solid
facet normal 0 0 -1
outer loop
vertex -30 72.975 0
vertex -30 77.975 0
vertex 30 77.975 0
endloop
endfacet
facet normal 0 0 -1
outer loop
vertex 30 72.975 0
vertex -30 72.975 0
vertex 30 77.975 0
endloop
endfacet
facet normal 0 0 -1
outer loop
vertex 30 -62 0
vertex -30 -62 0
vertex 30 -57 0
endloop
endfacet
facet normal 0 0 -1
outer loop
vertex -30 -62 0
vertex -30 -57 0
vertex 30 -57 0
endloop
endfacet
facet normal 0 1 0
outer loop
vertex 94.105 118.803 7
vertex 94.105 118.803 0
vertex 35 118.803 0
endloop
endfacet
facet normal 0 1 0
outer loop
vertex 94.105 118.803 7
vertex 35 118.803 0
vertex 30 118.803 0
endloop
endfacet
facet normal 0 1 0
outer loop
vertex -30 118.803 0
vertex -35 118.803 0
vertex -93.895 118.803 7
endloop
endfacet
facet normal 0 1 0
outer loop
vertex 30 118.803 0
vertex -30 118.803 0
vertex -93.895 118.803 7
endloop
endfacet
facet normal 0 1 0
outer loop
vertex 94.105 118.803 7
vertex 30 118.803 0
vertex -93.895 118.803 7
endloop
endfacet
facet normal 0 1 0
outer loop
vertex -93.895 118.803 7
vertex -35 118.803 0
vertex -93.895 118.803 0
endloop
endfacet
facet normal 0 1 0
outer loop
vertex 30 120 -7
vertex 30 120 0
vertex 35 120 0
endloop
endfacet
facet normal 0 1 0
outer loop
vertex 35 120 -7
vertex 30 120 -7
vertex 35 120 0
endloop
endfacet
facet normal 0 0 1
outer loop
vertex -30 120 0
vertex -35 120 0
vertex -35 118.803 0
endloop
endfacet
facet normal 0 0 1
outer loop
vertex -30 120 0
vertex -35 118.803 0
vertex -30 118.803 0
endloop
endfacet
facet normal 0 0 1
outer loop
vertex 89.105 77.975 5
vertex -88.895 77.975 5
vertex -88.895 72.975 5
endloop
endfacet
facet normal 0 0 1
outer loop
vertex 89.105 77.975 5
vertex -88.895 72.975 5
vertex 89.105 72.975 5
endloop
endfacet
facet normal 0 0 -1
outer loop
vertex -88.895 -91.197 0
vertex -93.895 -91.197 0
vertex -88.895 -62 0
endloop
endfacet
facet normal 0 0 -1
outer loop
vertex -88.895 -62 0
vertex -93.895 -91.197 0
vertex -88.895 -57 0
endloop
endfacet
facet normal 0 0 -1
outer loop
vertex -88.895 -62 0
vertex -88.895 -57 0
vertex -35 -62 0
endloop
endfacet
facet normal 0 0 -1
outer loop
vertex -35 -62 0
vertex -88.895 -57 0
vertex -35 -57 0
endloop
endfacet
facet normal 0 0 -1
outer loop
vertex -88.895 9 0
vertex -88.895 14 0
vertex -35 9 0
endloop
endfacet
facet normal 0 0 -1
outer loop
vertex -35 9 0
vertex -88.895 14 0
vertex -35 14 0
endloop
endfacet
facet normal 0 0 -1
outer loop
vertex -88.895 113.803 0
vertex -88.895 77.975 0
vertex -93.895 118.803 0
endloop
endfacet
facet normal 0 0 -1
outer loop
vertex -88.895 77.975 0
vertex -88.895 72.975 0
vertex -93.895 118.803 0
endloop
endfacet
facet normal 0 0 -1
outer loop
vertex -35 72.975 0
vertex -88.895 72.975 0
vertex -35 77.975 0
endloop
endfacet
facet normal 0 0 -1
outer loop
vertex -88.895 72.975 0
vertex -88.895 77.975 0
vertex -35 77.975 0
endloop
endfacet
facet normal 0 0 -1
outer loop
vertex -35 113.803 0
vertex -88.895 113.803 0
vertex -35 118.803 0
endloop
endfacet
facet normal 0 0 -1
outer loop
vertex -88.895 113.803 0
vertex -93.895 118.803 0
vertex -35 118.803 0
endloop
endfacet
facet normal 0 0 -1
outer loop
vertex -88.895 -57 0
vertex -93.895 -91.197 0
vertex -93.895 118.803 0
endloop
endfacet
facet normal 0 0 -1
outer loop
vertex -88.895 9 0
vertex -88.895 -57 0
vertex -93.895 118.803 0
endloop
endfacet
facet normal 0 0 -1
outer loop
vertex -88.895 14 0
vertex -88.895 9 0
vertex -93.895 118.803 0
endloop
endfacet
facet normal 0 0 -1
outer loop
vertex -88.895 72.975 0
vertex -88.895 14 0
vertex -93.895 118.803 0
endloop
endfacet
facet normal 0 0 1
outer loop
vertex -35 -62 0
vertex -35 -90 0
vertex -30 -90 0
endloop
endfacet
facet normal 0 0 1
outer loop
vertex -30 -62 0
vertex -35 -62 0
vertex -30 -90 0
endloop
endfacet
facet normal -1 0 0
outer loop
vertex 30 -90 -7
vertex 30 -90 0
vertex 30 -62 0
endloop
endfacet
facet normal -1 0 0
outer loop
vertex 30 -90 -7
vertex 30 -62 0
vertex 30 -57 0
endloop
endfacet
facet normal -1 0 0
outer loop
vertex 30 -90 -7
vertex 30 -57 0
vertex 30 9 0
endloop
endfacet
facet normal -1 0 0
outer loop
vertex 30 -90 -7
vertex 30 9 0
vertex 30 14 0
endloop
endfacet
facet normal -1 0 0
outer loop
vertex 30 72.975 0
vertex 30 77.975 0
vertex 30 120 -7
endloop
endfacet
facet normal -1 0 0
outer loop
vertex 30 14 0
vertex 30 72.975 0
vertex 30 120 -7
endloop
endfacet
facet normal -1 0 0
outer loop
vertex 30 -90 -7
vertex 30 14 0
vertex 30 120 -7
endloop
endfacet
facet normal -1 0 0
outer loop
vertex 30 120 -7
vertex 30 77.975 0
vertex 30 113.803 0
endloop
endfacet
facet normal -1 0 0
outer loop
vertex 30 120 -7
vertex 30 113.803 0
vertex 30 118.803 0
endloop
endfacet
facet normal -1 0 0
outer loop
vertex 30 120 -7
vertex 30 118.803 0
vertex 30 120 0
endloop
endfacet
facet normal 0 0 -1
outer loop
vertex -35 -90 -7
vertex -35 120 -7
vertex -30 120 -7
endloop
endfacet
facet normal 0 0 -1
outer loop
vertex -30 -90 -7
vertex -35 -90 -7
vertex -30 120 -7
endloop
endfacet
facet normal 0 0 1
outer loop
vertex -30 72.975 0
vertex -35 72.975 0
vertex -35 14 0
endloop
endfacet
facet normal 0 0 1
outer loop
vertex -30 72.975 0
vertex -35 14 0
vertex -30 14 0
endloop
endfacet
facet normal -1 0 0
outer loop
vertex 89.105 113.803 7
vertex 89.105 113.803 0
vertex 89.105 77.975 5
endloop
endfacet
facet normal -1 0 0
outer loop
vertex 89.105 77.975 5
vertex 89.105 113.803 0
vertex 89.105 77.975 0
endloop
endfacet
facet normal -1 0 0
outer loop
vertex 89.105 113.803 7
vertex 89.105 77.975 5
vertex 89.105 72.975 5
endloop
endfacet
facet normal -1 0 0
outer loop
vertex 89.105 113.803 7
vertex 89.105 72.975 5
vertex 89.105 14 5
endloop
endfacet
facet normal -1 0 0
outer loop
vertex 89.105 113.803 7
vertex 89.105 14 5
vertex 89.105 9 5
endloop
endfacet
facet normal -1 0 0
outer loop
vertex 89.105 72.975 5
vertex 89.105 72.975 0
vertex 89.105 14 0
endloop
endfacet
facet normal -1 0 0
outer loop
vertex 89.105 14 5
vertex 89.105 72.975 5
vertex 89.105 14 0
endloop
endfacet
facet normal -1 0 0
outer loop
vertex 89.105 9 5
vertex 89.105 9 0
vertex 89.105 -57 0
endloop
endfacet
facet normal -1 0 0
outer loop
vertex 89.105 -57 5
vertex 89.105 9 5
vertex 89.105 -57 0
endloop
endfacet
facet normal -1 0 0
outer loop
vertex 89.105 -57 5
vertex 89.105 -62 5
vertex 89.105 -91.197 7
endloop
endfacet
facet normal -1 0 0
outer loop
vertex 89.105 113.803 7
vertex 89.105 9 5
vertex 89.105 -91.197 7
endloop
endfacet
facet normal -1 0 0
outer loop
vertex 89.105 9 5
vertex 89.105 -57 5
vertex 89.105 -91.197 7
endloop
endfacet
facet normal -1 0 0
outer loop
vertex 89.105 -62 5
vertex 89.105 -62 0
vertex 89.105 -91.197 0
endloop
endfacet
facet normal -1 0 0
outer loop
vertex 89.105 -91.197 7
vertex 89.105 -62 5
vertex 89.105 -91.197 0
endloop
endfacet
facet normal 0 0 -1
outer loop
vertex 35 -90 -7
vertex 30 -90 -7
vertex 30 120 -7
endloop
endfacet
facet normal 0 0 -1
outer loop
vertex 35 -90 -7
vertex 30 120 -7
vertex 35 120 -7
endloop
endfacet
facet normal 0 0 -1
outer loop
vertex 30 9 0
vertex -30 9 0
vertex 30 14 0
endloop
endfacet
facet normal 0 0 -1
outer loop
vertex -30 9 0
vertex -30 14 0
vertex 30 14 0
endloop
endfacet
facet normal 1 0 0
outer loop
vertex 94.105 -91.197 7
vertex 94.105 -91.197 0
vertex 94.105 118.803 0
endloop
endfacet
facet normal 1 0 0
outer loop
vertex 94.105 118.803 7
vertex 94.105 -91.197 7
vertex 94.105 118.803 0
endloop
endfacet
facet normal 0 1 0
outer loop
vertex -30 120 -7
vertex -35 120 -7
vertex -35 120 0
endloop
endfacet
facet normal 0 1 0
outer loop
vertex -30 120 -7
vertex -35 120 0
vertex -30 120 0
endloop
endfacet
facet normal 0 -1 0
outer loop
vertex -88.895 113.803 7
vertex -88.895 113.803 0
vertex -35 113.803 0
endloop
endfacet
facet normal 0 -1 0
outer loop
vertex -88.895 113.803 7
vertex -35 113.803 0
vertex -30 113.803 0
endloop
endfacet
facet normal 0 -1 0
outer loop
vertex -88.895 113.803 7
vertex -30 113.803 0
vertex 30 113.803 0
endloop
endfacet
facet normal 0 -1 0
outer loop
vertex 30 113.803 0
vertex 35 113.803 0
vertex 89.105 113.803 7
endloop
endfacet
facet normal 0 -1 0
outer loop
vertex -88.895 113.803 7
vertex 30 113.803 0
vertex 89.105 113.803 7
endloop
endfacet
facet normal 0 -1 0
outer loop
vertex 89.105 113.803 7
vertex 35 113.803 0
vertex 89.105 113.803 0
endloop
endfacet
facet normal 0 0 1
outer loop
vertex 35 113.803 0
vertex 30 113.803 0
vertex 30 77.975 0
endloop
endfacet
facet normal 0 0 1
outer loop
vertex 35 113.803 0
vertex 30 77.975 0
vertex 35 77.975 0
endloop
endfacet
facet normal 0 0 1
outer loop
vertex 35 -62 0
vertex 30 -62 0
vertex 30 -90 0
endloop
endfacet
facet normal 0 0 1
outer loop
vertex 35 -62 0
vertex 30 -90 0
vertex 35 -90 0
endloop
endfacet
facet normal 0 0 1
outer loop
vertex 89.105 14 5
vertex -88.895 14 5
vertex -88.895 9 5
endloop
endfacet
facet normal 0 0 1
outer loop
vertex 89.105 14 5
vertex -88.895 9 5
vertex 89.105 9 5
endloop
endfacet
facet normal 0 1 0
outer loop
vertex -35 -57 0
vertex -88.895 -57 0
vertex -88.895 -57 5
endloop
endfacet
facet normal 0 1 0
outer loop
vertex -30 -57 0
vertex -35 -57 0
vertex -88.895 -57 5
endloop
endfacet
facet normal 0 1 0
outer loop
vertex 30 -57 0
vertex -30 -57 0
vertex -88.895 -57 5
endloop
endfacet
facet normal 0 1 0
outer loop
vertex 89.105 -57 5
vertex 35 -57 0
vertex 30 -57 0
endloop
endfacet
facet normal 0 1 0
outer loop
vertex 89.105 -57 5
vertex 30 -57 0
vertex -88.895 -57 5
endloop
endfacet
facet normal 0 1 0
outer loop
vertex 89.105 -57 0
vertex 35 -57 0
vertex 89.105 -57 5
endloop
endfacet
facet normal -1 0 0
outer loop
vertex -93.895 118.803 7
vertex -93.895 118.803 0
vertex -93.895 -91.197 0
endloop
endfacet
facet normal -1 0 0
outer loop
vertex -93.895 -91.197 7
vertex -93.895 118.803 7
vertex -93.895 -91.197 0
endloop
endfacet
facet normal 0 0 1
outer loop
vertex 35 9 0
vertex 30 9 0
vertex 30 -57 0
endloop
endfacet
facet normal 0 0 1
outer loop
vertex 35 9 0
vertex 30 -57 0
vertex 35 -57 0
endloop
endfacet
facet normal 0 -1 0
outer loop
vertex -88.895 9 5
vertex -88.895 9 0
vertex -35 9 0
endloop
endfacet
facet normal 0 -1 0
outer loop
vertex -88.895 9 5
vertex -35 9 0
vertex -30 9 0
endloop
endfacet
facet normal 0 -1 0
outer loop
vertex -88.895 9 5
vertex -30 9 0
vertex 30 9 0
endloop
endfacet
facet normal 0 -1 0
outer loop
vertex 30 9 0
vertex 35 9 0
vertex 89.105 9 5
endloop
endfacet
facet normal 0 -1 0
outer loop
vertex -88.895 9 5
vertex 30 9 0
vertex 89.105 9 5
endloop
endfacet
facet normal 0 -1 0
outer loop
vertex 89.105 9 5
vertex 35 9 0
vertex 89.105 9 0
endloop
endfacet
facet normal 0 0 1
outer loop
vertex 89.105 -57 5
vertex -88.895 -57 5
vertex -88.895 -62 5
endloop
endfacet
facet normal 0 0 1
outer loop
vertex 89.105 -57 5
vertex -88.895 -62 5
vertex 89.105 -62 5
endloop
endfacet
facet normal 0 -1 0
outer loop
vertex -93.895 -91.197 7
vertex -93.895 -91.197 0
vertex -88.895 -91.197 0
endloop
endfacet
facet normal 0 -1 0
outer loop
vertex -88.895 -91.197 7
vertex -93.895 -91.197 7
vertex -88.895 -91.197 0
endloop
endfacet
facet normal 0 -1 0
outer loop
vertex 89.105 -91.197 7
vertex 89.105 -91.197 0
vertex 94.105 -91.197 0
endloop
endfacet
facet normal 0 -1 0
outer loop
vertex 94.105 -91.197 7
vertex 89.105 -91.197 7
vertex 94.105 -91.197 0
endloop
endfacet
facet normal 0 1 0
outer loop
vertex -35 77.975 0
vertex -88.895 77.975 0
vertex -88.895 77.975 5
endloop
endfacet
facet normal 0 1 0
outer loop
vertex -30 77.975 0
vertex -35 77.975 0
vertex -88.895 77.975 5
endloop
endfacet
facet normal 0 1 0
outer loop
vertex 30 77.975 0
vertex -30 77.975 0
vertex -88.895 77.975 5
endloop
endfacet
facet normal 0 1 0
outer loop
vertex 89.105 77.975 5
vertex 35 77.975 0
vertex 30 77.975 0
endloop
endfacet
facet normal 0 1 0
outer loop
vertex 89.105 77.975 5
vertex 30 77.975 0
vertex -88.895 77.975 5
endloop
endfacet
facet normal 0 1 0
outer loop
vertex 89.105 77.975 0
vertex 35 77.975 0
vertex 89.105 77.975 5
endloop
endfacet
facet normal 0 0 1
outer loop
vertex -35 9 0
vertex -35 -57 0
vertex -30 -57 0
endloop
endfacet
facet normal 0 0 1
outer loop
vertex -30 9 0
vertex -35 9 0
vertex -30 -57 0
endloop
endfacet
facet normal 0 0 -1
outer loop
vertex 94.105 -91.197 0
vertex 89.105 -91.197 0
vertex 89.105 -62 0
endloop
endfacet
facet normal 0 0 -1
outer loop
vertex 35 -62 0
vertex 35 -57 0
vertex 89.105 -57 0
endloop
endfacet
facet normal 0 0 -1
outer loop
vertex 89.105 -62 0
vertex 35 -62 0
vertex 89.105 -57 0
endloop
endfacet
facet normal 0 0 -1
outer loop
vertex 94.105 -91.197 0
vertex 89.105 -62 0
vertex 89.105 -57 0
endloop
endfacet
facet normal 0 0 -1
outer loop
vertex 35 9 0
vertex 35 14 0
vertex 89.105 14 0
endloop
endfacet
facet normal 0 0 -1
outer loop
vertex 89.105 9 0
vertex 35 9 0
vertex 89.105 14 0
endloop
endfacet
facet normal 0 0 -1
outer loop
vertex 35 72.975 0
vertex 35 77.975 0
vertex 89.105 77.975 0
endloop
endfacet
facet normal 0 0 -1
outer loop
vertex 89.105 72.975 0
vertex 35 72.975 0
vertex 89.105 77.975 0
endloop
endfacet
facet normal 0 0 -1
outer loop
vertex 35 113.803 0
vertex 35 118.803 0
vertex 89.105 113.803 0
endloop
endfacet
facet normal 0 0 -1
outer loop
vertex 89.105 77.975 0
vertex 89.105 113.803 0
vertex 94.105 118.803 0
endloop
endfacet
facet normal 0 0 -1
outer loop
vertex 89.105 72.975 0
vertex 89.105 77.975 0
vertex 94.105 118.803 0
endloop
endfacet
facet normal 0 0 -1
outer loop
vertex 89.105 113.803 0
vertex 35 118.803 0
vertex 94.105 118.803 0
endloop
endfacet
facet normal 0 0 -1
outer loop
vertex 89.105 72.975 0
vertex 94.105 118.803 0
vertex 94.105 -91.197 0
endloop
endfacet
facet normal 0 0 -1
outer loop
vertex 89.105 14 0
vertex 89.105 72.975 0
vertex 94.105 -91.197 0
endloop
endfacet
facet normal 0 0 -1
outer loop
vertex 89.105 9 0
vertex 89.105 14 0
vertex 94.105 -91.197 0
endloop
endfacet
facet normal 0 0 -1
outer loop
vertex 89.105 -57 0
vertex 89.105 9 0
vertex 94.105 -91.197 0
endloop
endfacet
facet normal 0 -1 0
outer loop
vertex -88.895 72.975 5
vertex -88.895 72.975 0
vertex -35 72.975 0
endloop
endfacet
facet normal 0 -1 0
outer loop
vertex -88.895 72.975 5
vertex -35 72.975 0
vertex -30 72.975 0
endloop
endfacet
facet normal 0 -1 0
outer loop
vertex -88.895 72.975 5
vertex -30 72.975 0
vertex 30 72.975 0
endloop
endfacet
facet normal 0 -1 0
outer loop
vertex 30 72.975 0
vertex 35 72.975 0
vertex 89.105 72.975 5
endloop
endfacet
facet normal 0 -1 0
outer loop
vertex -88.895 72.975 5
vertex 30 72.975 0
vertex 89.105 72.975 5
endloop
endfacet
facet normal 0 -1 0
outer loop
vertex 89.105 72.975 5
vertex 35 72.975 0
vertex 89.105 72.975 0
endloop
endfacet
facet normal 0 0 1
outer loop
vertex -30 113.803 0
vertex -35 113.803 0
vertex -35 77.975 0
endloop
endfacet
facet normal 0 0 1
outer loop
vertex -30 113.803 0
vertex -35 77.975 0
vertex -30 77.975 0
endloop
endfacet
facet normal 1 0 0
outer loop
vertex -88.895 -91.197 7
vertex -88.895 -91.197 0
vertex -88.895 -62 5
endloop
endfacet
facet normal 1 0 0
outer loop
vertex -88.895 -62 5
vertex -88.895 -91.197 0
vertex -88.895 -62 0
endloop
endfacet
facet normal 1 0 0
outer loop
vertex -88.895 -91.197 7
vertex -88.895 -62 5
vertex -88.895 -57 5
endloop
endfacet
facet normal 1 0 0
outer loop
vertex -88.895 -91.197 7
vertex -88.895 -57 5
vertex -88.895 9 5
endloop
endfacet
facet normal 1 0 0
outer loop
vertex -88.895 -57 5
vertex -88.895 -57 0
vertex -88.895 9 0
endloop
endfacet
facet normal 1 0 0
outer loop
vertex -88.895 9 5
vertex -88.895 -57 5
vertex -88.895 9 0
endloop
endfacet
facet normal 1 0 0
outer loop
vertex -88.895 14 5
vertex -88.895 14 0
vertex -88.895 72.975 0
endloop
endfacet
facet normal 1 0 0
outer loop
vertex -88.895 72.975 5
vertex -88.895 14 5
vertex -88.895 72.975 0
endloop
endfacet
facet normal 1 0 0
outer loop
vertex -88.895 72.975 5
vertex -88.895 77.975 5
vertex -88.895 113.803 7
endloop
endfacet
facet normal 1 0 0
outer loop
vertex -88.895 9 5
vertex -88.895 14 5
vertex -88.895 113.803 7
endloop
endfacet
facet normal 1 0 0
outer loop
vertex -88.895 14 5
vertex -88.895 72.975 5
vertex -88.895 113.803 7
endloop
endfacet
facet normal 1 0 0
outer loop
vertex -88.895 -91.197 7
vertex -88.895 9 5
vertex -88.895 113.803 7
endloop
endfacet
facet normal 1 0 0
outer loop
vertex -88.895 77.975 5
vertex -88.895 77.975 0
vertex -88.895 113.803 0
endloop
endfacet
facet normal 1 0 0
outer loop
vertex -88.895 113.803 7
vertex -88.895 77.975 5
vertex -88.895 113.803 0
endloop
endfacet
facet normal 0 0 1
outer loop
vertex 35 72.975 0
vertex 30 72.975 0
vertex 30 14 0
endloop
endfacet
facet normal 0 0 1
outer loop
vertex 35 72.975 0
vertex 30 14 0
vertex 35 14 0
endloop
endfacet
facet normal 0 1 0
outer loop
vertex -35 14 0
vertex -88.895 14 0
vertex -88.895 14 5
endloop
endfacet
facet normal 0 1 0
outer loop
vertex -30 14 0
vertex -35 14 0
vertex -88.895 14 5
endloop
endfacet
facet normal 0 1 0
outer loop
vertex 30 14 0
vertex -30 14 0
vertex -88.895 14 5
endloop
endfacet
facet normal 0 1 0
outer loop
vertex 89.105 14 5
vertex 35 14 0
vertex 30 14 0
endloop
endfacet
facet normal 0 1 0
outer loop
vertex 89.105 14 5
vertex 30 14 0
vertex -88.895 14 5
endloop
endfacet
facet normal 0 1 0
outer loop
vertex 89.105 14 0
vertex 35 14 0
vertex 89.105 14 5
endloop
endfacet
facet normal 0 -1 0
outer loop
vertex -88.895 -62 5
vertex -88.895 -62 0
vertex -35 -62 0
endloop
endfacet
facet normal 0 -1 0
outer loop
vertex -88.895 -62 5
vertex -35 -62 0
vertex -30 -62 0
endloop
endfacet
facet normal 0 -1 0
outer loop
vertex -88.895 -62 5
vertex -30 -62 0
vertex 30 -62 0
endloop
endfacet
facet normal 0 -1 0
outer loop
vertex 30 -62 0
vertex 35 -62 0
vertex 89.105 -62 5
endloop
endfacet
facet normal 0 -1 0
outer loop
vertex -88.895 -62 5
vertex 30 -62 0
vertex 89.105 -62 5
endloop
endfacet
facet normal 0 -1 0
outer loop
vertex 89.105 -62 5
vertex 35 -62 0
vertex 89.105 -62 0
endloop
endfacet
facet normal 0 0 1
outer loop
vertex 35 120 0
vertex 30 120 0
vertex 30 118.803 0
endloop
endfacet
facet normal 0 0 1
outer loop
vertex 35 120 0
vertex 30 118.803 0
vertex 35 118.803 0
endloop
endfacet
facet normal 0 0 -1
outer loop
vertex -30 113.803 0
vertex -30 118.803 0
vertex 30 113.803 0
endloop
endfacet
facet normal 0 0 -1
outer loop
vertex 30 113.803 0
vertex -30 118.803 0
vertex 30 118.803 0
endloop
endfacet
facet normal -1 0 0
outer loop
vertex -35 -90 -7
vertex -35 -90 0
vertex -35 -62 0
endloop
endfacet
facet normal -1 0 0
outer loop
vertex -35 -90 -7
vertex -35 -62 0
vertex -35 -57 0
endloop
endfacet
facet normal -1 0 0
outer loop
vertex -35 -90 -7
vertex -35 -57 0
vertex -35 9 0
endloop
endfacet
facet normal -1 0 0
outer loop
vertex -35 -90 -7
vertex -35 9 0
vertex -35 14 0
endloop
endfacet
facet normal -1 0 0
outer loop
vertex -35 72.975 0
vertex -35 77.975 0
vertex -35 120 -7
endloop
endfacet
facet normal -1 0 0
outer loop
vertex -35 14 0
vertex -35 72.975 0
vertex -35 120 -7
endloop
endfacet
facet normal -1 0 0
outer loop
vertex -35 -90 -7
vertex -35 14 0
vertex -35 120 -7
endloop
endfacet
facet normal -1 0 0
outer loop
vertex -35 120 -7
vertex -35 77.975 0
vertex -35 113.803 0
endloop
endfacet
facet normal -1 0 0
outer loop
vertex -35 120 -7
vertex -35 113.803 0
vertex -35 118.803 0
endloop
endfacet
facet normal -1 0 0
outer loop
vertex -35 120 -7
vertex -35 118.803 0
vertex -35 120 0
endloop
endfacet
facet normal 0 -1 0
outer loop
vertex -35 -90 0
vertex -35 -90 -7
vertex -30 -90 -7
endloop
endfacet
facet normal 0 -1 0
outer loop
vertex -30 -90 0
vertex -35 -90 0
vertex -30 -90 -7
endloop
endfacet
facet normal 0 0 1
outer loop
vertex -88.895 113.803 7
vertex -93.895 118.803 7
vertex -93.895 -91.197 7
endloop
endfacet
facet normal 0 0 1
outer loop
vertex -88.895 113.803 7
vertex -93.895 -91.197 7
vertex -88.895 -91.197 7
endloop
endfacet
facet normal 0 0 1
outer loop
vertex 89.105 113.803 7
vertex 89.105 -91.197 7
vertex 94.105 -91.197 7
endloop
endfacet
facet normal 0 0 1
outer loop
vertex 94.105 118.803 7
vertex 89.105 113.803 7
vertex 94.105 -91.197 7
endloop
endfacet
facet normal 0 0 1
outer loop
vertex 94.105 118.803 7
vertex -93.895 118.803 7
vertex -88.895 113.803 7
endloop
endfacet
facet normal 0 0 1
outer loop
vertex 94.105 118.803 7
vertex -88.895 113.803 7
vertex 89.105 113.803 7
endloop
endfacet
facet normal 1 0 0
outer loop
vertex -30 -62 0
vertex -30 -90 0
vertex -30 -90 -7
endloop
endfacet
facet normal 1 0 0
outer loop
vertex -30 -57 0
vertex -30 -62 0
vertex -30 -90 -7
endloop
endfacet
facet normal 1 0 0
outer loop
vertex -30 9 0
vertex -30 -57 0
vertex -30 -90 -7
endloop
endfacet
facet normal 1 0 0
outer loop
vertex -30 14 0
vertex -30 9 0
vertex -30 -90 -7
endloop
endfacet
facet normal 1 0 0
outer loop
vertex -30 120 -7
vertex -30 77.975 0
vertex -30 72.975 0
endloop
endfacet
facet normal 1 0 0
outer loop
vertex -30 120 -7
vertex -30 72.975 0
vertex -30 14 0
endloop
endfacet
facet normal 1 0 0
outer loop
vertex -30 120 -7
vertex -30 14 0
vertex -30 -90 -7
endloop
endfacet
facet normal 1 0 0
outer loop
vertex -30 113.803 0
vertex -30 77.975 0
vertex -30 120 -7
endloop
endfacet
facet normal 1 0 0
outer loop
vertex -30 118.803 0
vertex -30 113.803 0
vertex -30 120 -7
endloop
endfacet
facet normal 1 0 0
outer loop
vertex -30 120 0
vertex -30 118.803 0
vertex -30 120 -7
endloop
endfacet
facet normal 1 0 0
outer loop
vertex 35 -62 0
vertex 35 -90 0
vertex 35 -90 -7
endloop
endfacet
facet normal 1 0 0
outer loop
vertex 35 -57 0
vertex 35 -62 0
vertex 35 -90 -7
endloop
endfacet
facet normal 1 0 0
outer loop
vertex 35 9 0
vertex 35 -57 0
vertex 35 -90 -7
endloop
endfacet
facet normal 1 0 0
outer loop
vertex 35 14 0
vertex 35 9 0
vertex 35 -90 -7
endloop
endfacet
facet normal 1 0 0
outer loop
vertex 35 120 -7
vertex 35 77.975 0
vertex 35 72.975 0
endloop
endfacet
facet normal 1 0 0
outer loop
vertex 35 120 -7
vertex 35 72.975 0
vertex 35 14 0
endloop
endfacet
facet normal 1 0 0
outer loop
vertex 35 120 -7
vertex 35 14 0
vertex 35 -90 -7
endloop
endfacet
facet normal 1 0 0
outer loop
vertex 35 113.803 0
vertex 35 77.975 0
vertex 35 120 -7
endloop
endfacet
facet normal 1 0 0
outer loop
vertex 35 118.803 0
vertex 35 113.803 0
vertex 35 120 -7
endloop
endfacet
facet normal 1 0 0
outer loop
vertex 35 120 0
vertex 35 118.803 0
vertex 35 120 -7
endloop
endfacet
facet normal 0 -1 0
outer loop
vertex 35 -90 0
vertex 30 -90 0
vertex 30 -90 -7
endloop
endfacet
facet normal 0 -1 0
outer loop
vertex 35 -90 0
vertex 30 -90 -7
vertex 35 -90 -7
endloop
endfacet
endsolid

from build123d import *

# Parameters (mm, degrees)
F1_DEPTH = 7
F2_W     = 180
F2_H     = 5
F3_DEPTH = 5
F4_W     = 5.000001
F4_H     = 210
F4_W_2   = 5
F5_DEPTH = 7


with BuildPart() as f1:
    # F0 (on Top) → F1 (new body)
    with BuildSketch(Plane.XY):
        Polygon((94.104588, 118.803262), (-93.895412, 118.803262), (-93.895412, -91.196738), (-88.895412, -91.196738), (-88.895412, 113.803262), (89.104588, 113.803262), (89.104588, -91.196738), (94.104588, -91.196738), align=None)
    extrude(amount=F1_DEPTH)

    # F2 (on Top) → F3 (join)
    with BuildSketch(Plane.XY):
        with Locations((0.104588, 75.474764)):
            Rectangle(F2_W, F2_H)
        with Locations((0.104588, 11.5)):
            Rectangle(F2_W, F2_H)
        with Locations((0.104588, -59.49998)):
            Rectangle(F2_W, F2_H)
    extrude(amount=F3_DEPTH)

    # F4 (on Top) → F5 (join)
    with BuildSketch(Plane.XY):
        with Locations((-32.5, 15)):
            Rectangle(F4_W, F4_H)
        with Locations((32.5, 15)):
            Rectangle(F4_W_2, F4_H)
    extrude(amount=-F5_DEPTH)


solid = f1.part
